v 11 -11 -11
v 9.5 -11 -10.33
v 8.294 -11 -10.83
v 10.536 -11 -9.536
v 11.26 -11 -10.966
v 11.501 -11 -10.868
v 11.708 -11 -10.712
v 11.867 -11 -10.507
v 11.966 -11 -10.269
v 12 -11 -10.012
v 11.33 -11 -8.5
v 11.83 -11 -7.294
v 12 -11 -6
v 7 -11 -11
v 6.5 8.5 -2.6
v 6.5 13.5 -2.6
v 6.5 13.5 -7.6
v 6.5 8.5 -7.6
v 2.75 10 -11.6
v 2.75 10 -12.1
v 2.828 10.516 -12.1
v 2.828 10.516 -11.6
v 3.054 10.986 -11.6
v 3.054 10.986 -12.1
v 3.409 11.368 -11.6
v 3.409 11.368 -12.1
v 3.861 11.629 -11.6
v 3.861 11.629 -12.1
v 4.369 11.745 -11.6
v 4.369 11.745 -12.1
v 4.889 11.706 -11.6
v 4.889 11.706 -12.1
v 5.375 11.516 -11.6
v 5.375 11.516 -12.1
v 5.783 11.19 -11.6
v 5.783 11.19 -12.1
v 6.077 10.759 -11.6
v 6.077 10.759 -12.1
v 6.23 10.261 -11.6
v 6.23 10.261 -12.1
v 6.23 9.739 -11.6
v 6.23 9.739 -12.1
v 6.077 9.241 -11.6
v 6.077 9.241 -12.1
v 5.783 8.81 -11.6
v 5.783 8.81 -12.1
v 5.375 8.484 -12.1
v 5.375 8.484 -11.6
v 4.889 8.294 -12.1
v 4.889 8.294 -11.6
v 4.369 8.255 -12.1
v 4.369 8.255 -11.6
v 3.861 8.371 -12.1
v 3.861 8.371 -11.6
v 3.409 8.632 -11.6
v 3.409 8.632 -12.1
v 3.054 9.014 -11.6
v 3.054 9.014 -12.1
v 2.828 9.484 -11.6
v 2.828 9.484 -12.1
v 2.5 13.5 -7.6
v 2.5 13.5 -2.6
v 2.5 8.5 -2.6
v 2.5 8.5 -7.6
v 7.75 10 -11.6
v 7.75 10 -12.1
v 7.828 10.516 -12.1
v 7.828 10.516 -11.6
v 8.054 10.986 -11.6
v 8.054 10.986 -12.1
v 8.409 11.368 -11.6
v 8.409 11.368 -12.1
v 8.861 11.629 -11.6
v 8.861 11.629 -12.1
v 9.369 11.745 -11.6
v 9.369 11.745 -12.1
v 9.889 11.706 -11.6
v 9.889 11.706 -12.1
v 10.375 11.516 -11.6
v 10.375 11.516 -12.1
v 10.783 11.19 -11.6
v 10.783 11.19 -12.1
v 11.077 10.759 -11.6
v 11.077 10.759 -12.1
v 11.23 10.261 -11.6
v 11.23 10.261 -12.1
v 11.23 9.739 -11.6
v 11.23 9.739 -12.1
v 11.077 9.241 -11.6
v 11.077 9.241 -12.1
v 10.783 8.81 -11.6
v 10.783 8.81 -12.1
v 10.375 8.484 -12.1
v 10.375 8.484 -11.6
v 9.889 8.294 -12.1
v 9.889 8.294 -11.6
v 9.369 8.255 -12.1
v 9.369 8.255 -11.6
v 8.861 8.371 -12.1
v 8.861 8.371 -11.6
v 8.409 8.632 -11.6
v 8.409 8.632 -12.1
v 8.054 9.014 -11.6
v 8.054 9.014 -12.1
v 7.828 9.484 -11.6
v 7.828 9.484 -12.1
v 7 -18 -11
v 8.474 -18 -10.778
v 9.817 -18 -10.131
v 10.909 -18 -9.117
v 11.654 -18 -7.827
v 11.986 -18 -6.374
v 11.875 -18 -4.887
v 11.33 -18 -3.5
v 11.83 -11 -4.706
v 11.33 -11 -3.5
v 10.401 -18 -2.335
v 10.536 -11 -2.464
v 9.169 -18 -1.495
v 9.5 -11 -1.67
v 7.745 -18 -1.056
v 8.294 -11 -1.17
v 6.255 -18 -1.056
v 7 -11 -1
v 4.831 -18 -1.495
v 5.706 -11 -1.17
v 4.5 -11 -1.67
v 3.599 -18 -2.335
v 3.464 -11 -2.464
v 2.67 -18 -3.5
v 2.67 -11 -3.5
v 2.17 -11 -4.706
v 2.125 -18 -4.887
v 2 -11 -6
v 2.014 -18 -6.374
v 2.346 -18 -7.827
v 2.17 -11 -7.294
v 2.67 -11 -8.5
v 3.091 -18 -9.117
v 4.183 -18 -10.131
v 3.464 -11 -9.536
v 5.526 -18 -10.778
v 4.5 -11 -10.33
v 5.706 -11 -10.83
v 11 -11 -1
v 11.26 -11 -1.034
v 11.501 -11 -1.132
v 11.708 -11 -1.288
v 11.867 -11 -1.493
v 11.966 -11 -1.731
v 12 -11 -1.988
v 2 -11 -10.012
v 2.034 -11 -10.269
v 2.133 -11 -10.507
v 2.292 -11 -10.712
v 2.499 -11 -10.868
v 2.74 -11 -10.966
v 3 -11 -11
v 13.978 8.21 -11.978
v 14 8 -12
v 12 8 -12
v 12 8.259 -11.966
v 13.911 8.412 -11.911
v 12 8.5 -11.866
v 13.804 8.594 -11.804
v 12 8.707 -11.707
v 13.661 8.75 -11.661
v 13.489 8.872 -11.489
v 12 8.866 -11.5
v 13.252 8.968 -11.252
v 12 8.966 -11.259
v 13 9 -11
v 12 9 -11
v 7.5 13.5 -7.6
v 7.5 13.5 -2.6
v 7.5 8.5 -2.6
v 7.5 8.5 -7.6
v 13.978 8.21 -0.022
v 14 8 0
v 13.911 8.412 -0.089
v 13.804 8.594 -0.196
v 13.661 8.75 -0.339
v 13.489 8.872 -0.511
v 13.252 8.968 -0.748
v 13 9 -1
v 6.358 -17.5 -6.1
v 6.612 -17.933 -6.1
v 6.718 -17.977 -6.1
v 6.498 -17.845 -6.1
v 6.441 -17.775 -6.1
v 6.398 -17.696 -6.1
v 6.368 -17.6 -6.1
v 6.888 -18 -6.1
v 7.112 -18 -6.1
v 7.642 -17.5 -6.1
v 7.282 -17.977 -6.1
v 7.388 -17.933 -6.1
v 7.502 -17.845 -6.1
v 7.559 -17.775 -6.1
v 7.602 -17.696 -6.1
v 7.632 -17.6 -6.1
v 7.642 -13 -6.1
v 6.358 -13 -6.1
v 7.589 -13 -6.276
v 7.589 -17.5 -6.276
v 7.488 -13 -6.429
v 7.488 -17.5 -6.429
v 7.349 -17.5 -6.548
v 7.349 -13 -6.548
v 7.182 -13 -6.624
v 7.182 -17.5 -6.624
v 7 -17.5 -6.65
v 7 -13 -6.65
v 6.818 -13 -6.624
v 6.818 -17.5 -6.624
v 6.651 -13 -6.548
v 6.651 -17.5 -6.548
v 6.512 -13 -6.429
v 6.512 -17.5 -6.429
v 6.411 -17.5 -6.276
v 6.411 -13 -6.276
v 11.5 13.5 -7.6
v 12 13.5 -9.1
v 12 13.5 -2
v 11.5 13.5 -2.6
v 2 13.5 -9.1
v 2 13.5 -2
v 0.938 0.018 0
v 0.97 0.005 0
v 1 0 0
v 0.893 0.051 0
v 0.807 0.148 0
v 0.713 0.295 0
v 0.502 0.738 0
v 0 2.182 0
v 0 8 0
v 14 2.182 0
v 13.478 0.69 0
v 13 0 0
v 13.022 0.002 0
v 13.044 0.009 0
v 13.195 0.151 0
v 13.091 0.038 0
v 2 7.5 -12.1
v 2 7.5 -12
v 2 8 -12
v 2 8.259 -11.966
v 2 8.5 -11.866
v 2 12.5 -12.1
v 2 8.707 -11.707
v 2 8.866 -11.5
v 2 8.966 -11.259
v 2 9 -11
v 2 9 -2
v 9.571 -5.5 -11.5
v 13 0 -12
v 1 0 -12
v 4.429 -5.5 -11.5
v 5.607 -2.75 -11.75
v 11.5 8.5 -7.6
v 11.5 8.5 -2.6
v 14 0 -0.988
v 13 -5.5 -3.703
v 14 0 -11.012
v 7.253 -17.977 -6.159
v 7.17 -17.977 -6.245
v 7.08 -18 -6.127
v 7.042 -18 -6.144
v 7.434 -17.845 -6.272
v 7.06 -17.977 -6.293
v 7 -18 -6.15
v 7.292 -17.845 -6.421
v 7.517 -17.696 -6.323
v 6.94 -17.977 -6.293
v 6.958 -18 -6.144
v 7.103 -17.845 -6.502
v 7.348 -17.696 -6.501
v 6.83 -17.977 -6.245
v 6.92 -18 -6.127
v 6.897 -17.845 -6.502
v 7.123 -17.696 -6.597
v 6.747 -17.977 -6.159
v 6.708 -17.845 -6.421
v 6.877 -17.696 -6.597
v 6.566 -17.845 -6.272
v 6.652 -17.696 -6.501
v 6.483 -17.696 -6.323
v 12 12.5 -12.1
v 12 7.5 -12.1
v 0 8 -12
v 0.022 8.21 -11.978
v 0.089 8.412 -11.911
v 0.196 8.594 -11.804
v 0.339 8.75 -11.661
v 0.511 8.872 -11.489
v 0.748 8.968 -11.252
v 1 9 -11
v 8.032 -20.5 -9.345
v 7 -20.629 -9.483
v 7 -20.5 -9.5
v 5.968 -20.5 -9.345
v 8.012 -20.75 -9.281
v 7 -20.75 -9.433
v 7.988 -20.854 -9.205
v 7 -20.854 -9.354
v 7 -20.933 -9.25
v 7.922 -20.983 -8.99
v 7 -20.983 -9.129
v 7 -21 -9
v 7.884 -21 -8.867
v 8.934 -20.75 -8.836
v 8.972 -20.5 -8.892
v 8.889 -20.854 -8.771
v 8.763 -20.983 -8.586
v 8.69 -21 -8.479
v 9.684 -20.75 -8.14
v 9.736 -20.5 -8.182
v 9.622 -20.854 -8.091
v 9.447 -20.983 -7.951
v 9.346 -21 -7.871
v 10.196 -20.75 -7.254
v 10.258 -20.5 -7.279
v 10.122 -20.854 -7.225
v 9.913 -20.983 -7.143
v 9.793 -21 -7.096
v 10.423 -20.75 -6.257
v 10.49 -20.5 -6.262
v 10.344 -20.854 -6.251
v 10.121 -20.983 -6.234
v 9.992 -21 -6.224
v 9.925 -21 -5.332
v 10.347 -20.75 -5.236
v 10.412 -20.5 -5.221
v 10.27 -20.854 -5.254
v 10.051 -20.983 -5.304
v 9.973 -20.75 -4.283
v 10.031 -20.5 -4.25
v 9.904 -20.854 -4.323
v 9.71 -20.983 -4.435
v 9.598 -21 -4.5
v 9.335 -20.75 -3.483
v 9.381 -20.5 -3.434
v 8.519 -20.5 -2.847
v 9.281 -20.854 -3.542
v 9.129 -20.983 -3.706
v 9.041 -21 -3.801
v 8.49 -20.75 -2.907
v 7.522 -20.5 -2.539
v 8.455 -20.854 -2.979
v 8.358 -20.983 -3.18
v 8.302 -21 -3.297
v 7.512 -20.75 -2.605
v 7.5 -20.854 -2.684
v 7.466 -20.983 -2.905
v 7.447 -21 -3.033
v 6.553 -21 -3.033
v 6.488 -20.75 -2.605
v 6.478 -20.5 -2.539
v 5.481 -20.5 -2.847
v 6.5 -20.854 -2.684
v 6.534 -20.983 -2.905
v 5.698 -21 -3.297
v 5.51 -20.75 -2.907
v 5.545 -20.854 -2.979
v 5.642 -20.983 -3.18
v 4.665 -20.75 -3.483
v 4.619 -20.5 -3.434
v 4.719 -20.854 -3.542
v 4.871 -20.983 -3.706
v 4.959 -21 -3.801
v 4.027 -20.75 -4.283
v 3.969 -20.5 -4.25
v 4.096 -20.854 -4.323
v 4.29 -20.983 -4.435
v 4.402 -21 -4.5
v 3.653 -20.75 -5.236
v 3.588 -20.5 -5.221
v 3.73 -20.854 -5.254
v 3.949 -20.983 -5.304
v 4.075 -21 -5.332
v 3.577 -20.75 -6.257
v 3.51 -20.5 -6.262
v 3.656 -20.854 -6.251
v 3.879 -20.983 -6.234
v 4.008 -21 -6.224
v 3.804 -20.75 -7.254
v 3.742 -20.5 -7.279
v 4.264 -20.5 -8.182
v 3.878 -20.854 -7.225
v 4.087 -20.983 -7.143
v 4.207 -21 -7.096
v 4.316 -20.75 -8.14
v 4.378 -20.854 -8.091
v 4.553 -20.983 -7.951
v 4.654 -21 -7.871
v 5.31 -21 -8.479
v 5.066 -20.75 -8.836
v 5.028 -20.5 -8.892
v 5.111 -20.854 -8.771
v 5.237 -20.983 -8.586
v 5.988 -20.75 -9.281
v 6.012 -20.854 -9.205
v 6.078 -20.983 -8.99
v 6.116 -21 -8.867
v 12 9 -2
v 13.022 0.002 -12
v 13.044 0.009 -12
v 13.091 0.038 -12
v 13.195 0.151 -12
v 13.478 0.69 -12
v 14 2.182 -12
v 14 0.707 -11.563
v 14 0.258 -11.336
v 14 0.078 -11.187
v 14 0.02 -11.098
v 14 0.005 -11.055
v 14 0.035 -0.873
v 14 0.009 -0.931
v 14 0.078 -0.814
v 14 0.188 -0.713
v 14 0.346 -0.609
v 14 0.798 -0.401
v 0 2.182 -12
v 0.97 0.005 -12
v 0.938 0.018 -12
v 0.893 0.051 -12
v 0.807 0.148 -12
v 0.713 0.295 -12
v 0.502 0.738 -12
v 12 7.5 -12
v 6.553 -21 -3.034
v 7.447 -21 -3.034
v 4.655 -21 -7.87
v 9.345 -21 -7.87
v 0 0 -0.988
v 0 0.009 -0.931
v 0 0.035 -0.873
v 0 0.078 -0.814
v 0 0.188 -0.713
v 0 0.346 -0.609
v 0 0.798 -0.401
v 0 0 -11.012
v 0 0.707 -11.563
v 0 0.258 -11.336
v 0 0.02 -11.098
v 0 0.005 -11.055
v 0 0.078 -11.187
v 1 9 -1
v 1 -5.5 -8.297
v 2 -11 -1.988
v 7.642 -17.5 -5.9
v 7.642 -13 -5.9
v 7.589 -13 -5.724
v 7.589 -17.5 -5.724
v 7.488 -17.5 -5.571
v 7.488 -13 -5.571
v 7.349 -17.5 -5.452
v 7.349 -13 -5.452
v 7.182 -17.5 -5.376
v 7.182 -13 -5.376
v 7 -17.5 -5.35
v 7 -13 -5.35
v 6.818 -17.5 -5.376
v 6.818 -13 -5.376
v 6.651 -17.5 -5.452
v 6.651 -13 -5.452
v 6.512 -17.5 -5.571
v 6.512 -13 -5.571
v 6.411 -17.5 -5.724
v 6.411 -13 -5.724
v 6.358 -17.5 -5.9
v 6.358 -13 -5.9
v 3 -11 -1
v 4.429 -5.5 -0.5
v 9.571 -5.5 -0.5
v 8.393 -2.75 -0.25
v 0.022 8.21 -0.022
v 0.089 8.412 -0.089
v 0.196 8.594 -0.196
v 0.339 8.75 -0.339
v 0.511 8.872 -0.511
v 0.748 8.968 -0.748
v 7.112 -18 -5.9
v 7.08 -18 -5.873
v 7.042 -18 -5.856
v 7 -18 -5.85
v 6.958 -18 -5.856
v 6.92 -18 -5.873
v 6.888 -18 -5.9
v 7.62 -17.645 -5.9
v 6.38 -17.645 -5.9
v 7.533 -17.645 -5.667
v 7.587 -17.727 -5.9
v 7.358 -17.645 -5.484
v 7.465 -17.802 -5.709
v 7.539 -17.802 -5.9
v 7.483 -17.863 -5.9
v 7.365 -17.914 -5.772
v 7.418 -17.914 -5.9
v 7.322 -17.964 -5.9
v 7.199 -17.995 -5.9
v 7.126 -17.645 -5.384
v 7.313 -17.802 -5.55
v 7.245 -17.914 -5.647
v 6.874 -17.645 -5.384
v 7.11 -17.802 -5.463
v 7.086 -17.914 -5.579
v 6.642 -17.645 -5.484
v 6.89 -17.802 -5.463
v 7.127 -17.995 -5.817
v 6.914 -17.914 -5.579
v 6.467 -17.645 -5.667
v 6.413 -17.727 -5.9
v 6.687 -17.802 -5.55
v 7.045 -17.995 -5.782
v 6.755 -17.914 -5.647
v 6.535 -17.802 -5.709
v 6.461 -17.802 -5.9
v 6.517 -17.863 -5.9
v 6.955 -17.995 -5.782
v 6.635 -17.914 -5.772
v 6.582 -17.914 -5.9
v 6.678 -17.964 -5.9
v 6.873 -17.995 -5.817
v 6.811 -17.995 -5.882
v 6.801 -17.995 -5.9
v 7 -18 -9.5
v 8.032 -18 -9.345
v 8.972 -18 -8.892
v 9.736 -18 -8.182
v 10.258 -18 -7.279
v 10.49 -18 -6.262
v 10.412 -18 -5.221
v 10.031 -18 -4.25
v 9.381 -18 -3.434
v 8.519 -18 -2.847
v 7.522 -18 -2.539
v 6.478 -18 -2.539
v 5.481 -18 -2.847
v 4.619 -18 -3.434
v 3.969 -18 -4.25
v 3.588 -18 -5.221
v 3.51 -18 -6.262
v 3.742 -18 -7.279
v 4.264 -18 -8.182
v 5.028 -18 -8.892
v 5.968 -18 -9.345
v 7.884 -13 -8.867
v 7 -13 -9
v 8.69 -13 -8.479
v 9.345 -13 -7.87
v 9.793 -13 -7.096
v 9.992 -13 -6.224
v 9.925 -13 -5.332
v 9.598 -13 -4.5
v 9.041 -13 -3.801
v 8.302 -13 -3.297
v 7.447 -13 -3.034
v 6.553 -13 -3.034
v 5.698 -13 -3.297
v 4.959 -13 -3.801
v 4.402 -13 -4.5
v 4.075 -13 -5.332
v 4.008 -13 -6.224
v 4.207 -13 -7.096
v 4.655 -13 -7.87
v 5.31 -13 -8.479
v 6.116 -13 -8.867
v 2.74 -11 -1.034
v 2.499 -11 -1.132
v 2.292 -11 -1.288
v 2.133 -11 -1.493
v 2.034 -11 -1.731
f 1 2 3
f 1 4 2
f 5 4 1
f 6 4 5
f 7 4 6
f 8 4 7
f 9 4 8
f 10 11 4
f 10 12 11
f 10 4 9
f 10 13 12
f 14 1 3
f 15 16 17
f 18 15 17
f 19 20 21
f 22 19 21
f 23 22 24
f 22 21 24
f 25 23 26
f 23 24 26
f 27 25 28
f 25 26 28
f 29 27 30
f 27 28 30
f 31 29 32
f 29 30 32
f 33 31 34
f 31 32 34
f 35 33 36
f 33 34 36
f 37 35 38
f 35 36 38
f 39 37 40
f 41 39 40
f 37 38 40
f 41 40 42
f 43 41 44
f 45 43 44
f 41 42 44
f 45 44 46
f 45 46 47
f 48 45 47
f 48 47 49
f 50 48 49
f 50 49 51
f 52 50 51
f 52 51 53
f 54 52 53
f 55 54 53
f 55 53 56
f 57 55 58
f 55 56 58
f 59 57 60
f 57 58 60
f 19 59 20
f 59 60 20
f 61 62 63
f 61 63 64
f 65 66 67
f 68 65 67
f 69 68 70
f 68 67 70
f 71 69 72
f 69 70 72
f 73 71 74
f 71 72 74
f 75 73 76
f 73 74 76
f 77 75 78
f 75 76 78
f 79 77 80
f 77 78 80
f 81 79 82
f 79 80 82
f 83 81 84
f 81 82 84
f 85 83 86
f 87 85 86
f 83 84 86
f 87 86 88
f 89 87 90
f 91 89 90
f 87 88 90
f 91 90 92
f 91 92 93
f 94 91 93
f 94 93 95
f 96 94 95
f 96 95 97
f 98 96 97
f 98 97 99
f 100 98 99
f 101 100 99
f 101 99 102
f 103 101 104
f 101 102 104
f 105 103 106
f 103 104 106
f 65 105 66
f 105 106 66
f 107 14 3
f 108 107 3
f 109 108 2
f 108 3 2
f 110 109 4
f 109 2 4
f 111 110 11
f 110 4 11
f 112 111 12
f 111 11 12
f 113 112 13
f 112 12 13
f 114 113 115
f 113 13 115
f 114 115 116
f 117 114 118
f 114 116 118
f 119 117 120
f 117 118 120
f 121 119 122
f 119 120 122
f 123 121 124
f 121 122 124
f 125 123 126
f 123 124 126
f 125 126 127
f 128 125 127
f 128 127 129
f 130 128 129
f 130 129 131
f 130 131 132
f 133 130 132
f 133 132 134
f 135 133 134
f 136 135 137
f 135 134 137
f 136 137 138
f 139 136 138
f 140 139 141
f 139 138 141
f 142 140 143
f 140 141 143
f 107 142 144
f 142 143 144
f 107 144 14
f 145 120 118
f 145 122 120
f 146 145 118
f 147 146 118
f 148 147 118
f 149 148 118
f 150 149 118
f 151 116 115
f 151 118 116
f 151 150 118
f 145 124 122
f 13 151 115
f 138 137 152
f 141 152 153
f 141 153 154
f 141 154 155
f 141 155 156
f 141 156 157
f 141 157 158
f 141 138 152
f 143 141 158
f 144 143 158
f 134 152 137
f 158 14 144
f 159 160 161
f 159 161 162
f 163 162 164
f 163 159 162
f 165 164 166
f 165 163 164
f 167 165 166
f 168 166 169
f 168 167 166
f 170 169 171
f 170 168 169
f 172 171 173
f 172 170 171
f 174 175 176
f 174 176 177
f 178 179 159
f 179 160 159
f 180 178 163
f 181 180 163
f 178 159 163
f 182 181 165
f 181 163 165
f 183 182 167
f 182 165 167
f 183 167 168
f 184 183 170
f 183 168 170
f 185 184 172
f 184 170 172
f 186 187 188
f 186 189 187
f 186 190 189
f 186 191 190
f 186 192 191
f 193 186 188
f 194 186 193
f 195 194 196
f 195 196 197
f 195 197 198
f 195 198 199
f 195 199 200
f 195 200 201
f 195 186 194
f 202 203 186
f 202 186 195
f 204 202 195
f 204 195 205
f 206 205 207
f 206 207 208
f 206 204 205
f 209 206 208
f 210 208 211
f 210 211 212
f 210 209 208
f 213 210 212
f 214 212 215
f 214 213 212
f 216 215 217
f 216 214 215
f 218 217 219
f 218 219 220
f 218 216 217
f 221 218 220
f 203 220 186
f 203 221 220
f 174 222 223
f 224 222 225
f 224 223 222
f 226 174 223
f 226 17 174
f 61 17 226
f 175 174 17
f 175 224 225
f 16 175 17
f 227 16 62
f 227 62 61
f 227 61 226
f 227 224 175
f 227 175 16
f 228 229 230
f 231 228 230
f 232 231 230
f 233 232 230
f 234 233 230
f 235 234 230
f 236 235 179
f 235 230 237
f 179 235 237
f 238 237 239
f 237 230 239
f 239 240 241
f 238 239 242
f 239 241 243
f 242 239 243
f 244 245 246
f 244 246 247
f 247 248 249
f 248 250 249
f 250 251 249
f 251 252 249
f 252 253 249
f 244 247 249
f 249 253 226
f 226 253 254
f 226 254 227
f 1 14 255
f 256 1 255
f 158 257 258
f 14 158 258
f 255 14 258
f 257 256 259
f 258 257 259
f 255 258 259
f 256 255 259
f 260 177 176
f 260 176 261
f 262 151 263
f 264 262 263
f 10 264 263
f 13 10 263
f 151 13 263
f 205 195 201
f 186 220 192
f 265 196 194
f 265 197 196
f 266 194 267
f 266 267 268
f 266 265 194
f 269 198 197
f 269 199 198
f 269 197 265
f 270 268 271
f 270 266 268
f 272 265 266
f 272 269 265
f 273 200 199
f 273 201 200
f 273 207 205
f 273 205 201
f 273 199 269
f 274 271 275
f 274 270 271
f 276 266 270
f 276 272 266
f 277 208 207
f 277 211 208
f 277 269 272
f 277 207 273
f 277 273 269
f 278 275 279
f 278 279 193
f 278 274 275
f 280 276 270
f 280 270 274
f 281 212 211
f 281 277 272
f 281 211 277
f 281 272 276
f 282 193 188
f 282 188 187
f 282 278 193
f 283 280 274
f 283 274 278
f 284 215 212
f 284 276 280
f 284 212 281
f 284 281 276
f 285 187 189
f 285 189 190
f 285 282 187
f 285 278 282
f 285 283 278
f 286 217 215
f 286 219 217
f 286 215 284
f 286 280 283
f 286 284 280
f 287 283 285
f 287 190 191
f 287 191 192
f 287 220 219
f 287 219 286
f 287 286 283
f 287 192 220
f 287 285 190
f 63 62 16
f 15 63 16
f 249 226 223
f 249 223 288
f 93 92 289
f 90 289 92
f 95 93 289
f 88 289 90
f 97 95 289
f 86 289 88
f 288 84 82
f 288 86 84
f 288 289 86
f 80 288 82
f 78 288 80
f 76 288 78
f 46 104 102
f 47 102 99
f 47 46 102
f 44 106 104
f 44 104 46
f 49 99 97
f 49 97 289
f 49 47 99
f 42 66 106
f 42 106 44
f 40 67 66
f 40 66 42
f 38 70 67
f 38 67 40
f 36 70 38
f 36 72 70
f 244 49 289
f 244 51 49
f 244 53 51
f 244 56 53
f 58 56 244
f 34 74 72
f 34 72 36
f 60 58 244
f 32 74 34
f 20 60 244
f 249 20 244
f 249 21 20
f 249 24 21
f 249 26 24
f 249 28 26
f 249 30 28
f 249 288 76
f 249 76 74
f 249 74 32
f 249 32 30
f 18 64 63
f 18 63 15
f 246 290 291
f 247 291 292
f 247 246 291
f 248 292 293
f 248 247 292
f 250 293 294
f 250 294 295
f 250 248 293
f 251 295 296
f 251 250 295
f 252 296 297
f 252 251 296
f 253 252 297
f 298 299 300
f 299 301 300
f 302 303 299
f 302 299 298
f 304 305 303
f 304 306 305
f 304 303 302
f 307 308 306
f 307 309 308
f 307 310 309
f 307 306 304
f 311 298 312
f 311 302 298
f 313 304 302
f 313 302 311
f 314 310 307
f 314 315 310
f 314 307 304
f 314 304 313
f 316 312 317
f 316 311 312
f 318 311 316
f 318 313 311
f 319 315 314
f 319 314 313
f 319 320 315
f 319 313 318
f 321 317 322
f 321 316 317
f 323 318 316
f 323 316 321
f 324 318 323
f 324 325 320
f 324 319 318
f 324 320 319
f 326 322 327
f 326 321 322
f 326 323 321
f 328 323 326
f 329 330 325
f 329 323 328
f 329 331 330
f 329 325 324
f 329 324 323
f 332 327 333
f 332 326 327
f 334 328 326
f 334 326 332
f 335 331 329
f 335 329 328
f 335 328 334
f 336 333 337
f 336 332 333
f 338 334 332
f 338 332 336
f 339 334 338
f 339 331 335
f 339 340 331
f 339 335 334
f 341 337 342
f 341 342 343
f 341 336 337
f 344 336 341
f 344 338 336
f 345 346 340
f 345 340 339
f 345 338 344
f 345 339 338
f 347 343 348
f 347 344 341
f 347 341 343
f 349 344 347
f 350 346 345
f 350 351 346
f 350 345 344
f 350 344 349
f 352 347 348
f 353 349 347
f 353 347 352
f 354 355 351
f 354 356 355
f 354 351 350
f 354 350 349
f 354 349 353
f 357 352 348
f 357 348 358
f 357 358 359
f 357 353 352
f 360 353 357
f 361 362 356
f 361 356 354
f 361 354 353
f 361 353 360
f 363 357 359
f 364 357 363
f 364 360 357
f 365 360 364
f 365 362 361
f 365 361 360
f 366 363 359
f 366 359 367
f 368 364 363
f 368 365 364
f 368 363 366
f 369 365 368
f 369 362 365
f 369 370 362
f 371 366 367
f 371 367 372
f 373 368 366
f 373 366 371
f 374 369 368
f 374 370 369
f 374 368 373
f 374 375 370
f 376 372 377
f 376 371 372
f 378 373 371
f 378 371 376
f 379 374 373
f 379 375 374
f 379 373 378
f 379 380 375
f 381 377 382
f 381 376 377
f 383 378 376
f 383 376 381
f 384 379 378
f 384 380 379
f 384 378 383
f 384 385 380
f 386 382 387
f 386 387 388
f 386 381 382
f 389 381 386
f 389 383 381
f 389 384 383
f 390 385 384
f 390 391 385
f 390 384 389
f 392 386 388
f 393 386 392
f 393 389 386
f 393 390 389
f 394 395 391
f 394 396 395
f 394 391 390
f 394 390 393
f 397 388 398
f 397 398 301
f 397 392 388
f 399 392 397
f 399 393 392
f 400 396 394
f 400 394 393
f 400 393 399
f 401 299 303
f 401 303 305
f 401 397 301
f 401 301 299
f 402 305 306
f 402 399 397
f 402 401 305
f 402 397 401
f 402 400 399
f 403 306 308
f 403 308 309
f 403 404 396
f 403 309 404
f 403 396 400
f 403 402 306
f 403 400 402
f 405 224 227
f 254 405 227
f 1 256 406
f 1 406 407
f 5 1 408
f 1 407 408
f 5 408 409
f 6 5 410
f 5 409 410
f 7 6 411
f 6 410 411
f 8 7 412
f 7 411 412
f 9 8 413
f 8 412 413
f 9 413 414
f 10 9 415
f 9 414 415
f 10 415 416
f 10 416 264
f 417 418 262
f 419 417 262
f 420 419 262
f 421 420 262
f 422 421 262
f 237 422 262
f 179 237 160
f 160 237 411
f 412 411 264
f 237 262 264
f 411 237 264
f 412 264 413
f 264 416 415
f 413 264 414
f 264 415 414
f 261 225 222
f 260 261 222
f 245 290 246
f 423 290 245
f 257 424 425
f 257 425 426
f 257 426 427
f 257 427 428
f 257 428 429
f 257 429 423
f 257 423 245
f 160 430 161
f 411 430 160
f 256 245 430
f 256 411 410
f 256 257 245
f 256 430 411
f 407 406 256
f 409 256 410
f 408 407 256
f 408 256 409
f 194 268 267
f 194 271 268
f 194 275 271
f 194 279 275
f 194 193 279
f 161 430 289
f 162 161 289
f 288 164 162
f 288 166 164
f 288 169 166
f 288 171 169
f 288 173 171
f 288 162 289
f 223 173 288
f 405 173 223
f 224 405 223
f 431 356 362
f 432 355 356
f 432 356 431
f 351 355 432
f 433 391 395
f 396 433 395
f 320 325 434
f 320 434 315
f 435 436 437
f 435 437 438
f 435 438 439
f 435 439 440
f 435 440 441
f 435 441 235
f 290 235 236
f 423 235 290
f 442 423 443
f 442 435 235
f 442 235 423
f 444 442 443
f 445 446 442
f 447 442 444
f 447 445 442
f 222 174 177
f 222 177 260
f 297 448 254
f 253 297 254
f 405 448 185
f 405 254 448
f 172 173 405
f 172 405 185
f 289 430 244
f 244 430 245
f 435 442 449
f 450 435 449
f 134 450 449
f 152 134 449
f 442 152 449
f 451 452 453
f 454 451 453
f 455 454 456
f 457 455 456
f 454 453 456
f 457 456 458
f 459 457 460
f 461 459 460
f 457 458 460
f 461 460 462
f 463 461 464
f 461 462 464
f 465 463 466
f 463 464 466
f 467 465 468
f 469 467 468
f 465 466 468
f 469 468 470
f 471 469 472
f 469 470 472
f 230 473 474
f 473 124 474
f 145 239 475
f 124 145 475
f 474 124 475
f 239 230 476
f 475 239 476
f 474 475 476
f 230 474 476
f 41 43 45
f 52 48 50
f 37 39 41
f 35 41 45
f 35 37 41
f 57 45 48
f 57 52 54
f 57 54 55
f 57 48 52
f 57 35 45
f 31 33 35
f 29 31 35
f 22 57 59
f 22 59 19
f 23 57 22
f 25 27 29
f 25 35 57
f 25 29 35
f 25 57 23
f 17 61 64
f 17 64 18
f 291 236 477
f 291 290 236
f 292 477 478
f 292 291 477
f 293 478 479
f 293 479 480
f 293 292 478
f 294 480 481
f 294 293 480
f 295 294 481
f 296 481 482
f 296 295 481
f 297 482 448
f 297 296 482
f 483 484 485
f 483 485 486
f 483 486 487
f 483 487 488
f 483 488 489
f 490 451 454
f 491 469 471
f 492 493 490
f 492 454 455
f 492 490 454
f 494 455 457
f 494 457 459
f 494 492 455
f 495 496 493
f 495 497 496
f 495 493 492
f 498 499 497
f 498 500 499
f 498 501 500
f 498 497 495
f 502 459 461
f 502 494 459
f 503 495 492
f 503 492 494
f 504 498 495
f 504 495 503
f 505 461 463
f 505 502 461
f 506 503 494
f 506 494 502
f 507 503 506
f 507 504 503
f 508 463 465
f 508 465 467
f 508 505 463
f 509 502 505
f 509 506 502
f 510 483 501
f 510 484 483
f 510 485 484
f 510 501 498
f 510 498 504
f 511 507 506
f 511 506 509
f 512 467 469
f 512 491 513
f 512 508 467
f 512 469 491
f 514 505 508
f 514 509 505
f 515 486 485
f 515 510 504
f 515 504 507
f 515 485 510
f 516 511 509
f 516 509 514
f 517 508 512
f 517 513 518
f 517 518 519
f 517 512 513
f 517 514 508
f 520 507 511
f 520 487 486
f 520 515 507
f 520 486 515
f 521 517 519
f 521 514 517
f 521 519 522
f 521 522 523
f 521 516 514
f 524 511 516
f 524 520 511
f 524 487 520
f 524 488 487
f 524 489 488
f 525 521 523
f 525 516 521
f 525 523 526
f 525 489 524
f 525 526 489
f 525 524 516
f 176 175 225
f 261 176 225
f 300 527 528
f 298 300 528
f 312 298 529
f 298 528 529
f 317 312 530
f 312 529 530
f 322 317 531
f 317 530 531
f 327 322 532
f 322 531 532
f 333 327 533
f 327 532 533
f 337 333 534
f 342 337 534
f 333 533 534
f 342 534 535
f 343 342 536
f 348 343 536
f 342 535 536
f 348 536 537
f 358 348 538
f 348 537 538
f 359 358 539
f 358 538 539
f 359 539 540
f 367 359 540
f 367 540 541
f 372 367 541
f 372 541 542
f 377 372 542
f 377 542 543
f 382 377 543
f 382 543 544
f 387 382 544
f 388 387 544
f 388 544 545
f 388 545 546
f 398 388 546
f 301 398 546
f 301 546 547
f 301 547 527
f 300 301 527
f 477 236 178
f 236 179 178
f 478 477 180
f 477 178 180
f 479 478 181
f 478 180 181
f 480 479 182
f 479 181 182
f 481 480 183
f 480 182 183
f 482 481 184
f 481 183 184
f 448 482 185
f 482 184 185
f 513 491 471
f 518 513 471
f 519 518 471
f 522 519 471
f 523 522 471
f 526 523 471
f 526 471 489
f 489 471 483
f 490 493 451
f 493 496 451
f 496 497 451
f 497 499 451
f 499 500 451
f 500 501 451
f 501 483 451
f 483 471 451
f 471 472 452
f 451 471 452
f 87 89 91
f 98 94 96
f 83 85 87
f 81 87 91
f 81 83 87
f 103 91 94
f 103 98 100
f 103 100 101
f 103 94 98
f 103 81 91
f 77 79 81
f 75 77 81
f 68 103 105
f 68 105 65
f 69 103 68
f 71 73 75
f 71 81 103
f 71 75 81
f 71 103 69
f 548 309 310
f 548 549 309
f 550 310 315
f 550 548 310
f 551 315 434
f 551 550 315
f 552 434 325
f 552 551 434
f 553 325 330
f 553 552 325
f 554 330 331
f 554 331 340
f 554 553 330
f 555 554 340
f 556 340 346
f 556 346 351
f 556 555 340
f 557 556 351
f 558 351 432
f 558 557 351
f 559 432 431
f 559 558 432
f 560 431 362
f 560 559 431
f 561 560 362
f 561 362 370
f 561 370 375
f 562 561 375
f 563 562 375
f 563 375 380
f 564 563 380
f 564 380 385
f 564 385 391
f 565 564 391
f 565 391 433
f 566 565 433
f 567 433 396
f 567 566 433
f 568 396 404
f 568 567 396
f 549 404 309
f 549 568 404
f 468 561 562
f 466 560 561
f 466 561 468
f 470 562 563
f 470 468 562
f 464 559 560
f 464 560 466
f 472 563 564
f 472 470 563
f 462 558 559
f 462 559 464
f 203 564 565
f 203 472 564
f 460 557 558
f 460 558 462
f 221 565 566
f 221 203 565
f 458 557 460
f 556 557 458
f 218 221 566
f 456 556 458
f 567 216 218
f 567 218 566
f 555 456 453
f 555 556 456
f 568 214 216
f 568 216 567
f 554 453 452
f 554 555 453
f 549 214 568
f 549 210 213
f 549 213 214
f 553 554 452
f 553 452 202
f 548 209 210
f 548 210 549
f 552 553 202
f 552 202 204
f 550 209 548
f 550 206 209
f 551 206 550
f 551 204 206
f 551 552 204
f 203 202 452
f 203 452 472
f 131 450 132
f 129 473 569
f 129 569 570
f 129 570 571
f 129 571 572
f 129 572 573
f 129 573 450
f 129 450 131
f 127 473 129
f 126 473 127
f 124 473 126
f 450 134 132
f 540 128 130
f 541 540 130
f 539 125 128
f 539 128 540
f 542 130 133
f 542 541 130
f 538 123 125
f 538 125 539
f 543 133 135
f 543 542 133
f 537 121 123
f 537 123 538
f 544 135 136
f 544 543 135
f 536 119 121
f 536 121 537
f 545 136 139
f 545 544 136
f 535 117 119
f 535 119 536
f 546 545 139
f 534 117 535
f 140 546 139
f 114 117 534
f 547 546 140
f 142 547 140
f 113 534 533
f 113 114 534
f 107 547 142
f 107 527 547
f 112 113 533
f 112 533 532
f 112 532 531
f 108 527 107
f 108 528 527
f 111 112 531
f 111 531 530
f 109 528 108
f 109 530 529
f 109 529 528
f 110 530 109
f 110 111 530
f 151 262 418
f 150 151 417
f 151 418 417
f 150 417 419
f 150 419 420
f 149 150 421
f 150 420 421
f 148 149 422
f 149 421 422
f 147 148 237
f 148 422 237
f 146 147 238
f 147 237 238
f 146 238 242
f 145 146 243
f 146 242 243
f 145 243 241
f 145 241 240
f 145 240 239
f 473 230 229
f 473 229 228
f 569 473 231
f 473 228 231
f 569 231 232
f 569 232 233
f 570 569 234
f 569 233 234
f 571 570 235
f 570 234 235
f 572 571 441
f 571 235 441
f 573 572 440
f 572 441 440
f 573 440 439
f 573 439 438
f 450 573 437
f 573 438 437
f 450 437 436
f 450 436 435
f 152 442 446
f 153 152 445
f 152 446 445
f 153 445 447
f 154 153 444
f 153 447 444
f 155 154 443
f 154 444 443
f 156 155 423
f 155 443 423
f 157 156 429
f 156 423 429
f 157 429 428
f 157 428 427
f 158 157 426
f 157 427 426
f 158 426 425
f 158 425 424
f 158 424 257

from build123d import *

# Parameters (mm, degrees)
SKETCH_1_W          = 14
SKETCH_1_H          = 12
EXTRUDE_1_DEPTH     = 9
FILLET_2_R          = 1
FILLET_3_R          = 1
SKETCH_8_W          = 10
SKETCH_8_H          = 5.607572988
CUT_EXTRUDE_2_DEPTH = 10
SKETCH_9_W          = 10
SKETCH_9_H          = 6
EXTRUDE_3_DEPTH     = 10.1
SKETCH_10_R         = 1.75
CUT_EXTRUDE_3_DEPTH = 0.5
CUT_EXTRUDE_4_DEPTH = 22.740745157
SKETCH_12_W         = 4
SKETCH_12_H         = 5
CUT_EXTRUDE_5_DEPTH = 5
EXTRUDE_5_DEPTH     = 3
SKETCH_17_R         = 5
EXTRUDE_6_DEPTH     = 7
SKETCH_14_R         = 3.5
SKETCH_14_R_2       = 3
EXTRUDE_7_DEPTH     = 10
FILLET_5_R          = 0.5
CUT_EXTRUDE_START   = -5
SKETCH_18_R         = 3
CUT_EXTRUDE_7_DEPTH = 5
FILLET_6_R          = 0.5


# Some blends are built 0.0001 mm under size
with BuildPart() as part:
    # 草图1 → 凸台-拉伸1 (new body)
    with BuildSketch(Plane(origin=(0, 0, 0), x_dir=(1, 0, 0), z_dir=(0, 1, 0))):
        with Locations((7, 6)):
            Rectangle(SKETCH_1_W, SKETCH_1_H)
    extrude(amount=EXTRUDE_1_DEPTH)

    # 圆角2
    fillet_2_edges = [part.edges().sort_by_distance(p)[0] for p in [
        (14, 9, -6),
        (7, 9, -12),
        (0, 9, -6),
        (7, 9, 0),
    ]]
    fillet(fillet_2_edges, radius=FILLET_2_R)

    # 草图4 → 放样1 section 0
    with BuildSketch(Plane.XZ):
        with BuildLine():
            Line((0, 0), (14, 0))
            Line((14, 0), (14, -12))
            Line((14, -12), (0, -12))
            Line((0, -12), (0, 0))
        make_face()
    # 草图5 → 放样1 section 1
    with BuildSketch(Plane(origin=(0, -11, 0), x_dir=(-1, 0, 0), z_dir=(0, -1, 0))):
        with BuildLine():
            Line((-2, 1), (-12, 1))
            Line((-12, 1), (-12, 11))
            Line((-12, 11), (-2, 11))
            Line((-2, 11), (-2, 1))
        make_face()
    loft()

    # 圆角3
    # the kernel refuses this fillet: 1 mm, written as the material it takes off along each edge
    with BuildSketch(Plane(origin=(14.438278825, 2.410533539, -12.219139413), x_dir=(0.015936381457793344, 0.08765009801785527, 0.9960238411119947), z_dir=(-0.1781741612749496, -0.9799578870122228, 0.0890870806374748)), Plane(origin=(14.438278825, 2.410533539, 0.219139413), x_dir=(-0.9839989676081822, 0.17744243678180333, 0.016131130616527562), z_dir=(-0.1781741612749496, -0.9799578870122228, -0.08908708063747467))) as fillet_3_piece_1:
        with BuildLine():
            CenterArc((FILLET_3_R * 0.983933522321, FILLET_3_R), FILLET_3_R, 180.927975892, 89.072024108)
            Line((-FILLET_3_R * 0.0159353215369, FILLET_3_R * 0.983804473396), (0, 0))
            Line((0, 0), (FILLET_3_R * 0.983933522321, 0))
        make_face()
    extrude(amount=16.144639772, mode=Mode.SUBTRACT)
    with BuildSketch(Plane(origin=(-0.438278825, 2.410533539, -12.219139413), x_dir=(-0.015936381457791863, 0.08765009801785537, 0.9960238411119947), z_dir=(0.1781741612749496, -0.9799578870122228, 0.08908708063747463)), Plane(origin=(-0.438278825, 2.410533539, 0.219139413), x_dir=(0.9839989676081822, 0.17744243678180333, 0.016131130616527607), z_dir=(0.1781741612749496, -0.9799578870122228, -0.0890870806374748))) as fillet_3_piece_2:
        with BuildLine():
            CenterArc((FILLET_3_R * 0.983933522321, -FILLET_3_R), FILLET_3_R, 90, 89.072024108)
            Line((-FILLET_3_R * 0.0159353215369, -FILLET_3_R * 0.983804473396), (0, 0))
            Line((0, 0), (FILLET_3_R * 0.983933522321, 0))
        make_face()
    extrude(amount=16.144639772, mode=Mode.SUBTRACT)

    # 草图8 → 切除-拉伸2 (cut)
    with BuildSketch(Plane(origin=(0, 0, -12), x_dir=(-1, 0, 0), z_dir=(0, 0, -1))):
        with Locations((-7, 10.303786494)):
            Rectangle(SKETCH_8_W, SKETCH_8_H)
    extrude(amount=-CUT_EXTRUDE_2_DEPTH, mode=Mode.SUBTRACT)

    # 草图9 → 凸台-拉伸3 (add)
    with BuildSketch(Plane(origin=(0, 0, -2), x_dir=(-1, 0, 0), z_dir=(0, 0, -1))):
        with Locations((-7, 10.5)):
            Rectangle(SKETCH_9_W, SKETCH_9_H)
    extrude(amount=EXTRUDE_3_DEPTH)

    # 草图10 → 切除-拉伸3 (cut)
    with BuildSketch(Plane(origin=(0, 0, -12.1), x_dir=(-1, 0, 0), z_dir=(0, 0, -1))):
        with Locations((-4.5, 10)):
            Circle(SKETCH_10_R)
        with Locations((-9.5, 10)):
            Circle(SKETCH_10_R)
    extrude(amount=-CUT_EXTRUDE_3_DEPTH, mode=Mode.SUBTRACT)

    # 草图11 → 切除-拉伸4 (cut, through all)
    with BuildSketch(Plane.ZY.offset(-2)):
        Polygon((-12.1, 12.5), (-12.1, 13.5), (-9.1, 13.5), align=None)
    extrude(amount=-CUT_EXTRUDE_4_DEPTH, mode=Mode.SUBTRACT)

    # 草图12 → 切除-拉伸5 (cut)
    with BuildSketch(Plane(origin=(0, 13.5, 0), x_dir=(1, 0, 0), z_dir=(0, 1, 0))):
        with Locations((4.5, 5.1)):
            Rectangle(SKETCH_12_W, SKETCH_12_H)
        with Locations((9.5, 5.1)):
            Rectangle(SKETCH_12_W, SKETCH_12_H)
    extrude(amount=-CUT_EXTRUDE_5_DEPTH, mode=Mode.SUBTRACT)

    # 草图15 → 凸台-拉伸5 (add)
    with BuildSketch(Plane.XZ.offset(11)):
        with BuildLine():
            Line((6.95, -5.251668523), (6.95, -6.748331477))
            ThreePointArc((6.95, -6.748331477), (6.25, -6), (6.95, -5.251668523))
        make_face()
        with BuildLine():
            Line((7.05, -5.251668523), (7.05, -6.748331477))
            ThreePointArc((7.05, -6.748331477), (7.75, -6), (7.05, -5.251668523))
        make_face()
    extrude(amount=EXTRUDE_5_DEPTH)

    # 草图17 → 凸台-拉伸6 (add)
    with BuildSketch(Plane.XZ.offset(11)):
        with Locations(Location((7, -6, 0), (0, 0, 270))):
            Circle(SKETCH_17_R)
    extrude(amount=EXTRUDE_6_DEPTH)

    # 草图14 → 凸台-拉伸7 (add)
    with BuildSketch(Plane.XZ.offset(11)):
        with Locations(Location((7, -6, 0), (0, 0, 270))):
            Circle(SKETCH_14_R)
        with Locations(Location((7, -6, 0), (0, 0, 270))):
            Circle(SKETCH_14_R_2, mode=Mode.SUBTRACT)
    extrude(amount=EXTRUDE_7_DEPTH)

    # 圆角5
    fillet_5_edges = [part.edges().sort_by_distance(p)[0] for p in [
        (7, -21, -2.5),
    ]]
    fillet(fillet_5_edges, radius=FILLET_5_R - 0.0001)  # a hair under: the kernel refuses the full size

    # 草图18 → 切除-拉伸7 (cut)
    with BuildSketch(Plane.XZ.offset(18).offset(CUT_EXTRUDE_START)):
        with Locations(Location((7, -6, 0), (0, 0, 270))):
            Circle(SKETCH_18_R)
        with BuildLine():
            Line((6.357738371, -5.9), (7.642261629, -5.9))
            ThreePointArc((7.642261629, -5.9), (7, -5.35), (6.357738371, -5.9))
        make_face(mode=Mode.SUBTRACT)
        with BuildLine():
            Line((6.357738371, -6.1), (7.642261629, -6.1))
            ThreePointArc((7.642261629, -6.1), (7, -6.65), (6.357738371, -6.1))
        make_face(mode=Mode.SUBTRACT)
    extrude(amount=CUT_EXTRUDE_7_DEPTH, mode=Mode.SUBTRACT)

    # 圆角6
    fillet_6_edges = [part.edges().sort_by_distance(p)[0] for p in [
        (7, -18, -5.35),
        (7, -18, -6.65),
    ]]
    fillet(fillet_6_edges, radius=FILLET_6_R)


solid = part.part
